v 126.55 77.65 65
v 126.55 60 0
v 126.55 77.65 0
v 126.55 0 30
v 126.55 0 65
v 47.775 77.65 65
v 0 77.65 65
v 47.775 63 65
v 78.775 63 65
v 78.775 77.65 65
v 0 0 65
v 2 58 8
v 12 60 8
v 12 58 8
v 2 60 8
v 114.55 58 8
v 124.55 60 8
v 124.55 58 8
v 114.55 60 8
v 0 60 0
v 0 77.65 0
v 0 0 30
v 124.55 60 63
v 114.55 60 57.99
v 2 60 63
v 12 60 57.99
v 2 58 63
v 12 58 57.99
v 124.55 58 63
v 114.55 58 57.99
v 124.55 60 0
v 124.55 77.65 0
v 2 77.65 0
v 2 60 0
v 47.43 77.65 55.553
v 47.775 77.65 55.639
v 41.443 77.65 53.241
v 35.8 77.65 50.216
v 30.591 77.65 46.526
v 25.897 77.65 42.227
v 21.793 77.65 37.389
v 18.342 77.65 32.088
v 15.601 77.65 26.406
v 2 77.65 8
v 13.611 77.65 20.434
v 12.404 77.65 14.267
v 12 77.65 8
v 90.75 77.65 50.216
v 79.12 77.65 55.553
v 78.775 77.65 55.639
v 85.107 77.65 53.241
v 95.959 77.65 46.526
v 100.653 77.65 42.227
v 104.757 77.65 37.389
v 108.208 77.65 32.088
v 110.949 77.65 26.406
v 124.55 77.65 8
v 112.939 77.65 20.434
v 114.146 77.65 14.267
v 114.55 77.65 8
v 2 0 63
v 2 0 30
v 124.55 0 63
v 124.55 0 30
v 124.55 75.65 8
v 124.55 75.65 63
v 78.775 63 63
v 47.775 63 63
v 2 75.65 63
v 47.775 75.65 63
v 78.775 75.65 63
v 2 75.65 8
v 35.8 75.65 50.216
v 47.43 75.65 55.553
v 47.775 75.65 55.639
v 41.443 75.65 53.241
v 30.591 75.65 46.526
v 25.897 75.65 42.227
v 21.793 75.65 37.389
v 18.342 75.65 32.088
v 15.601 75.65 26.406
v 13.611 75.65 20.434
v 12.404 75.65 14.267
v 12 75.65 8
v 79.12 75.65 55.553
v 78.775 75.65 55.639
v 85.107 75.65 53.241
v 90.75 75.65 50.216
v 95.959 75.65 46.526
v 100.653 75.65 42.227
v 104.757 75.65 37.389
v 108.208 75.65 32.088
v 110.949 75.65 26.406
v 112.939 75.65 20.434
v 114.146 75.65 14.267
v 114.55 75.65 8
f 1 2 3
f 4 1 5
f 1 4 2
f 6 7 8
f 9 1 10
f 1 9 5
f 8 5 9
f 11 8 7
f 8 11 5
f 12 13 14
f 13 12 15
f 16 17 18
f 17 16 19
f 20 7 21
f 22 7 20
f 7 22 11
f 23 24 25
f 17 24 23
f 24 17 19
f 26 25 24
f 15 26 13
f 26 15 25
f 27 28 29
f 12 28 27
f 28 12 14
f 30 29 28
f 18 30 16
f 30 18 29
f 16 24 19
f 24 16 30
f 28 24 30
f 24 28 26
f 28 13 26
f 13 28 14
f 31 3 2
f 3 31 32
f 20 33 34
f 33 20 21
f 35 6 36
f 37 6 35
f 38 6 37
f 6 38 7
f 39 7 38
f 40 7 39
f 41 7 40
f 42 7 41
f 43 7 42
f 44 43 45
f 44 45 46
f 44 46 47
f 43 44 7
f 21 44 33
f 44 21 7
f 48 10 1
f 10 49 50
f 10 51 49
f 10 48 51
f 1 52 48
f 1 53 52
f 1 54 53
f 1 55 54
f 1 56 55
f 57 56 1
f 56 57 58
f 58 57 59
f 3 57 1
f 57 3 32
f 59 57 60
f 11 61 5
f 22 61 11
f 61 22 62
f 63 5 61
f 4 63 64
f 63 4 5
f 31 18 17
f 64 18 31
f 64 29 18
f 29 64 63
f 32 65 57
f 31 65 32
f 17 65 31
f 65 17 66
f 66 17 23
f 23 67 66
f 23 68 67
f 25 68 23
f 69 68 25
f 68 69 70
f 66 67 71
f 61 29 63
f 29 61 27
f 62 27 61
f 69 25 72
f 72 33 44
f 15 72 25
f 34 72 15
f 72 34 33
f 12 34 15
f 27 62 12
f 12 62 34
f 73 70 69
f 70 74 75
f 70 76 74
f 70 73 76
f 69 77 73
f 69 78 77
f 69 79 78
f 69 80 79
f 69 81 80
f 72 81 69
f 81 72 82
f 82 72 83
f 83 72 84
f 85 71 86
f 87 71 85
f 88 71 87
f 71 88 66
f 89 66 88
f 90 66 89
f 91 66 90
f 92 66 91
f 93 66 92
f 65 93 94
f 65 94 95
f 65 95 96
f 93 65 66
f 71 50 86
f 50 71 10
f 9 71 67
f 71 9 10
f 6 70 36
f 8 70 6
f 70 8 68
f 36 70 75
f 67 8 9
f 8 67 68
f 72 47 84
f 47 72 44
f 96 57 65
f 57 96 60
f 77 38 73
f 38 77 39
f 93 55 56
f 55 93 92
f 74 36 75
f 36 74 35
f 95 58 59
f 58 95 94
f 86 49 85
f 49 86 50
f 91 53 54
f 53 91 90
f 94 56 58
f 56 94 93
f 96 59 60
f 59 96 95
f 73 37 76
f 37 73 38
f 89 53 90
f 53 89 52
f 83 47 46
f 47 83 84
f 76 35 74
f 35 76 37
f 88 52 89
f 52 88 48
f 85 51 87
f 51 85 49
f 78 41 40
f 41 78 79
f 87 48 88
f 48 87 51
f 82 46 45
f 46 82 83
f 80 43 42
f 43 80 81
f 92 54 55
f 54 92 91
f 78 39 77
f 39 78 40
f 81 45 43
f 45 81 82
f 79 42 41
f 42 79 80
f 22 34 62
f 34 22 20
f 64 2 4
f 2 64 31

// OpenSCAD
//by Eric Hughes

//Roundness - 20 for testing, 50 for printing
$fn=50;

//Thickness of panes
thick = 2;//

//GPS Width
bbx = 122.55;

//How far the shade extends out from the face
bby = 60;

//GPS thickness (gap needed to slide down from top)
GThick = 15.65; 

// How far down the left and right shade extends 
z = 63;

//holding bracket lip on x (sides).  How much covers face.
hx = 10; 

//holding bracket lip in Z (top)
hz = 5;

//how far down holding bracket goes (if hbd=z then all the way)(don't let it cover your USB power jack)
hbd = 55; 

//width of cut needed for back support bracket
bsx = 31;

//how much of GThick can stay without bracket getting in the way.  If it overhangs the face this number should be negative
bsy = 3;

//from the bottom, how much of the shade corder should be cut off in the z direction (height)
crnrz=30;

//from the bottom, how much of the shade corner should be cut off in the y direction (depth)
crnry=60;


finalizeshade();
//buildshade();

module finalizeshade(){
difference(){
    moveshade();
    cornercut();
    }}

module moveshade(){
translate([(bbx+2*thick)/2, (bby+GThick+thick)/2, (z+thick)/2]){
buildshade();
}}

module cornercut(){
rotate([90,0,90])
//rotate(90)
linear_extrude(height=500){
polygon(points=[[0,0],[crnry,0],[0,crnrz]]);
}}
   
module buildshade(){
    difference(){
    holder();
    cutblock2();
        }
difference(){
    baseblock();
    cutblock1();
    backsupportcut();
    backcut();
    backcircularcut();
}}

module baseblock(){
    cube([bbx+2*thick, bby+GThick+thick, z+thick],center=true);
}

module cutblock1(){
    translate([0,-thick,-thick]){
    cube([bbx, bby+GThick+thick , z+thick],center=true);
}}

module holder(){
     translate([0,((bby+GThick)/2)-thick-GThick,(z-hbd)/2]){
    cube([bbx+2*thick, thick, z+thick-(z-hbd)],center=true);
}}

module cutblock2(){
    translate([0,-thick-.01,-thick-hz-.01]){
    cube([bbx-2*hx, bby+GThick+thick, z+thick],center=true);
}}

module backsupportcut(){
    translate([0,25+(bby/2)+(GThick/2)+(thick/2)-thick-(GThick-bsy),0]){
    cube([bsx,50, 2*z],center=true);
    }}
    
module backcut(){
    translate([0,0,-hbd-thick]){
        cube([bbx, bby+GThick+thick, z+thick],center=true);
}}

module backcircularcut(){
    translate([0,.5+(bby+GThick+thick)/2,(z+thick)/2-thick-hbd]){
    rotate([90,0,0]){
        scale([1,(hbd-hz)/((bbx-2*hx)/2)])cylinder(h=thick+1, d=(bbx-2*hx));
}}}
